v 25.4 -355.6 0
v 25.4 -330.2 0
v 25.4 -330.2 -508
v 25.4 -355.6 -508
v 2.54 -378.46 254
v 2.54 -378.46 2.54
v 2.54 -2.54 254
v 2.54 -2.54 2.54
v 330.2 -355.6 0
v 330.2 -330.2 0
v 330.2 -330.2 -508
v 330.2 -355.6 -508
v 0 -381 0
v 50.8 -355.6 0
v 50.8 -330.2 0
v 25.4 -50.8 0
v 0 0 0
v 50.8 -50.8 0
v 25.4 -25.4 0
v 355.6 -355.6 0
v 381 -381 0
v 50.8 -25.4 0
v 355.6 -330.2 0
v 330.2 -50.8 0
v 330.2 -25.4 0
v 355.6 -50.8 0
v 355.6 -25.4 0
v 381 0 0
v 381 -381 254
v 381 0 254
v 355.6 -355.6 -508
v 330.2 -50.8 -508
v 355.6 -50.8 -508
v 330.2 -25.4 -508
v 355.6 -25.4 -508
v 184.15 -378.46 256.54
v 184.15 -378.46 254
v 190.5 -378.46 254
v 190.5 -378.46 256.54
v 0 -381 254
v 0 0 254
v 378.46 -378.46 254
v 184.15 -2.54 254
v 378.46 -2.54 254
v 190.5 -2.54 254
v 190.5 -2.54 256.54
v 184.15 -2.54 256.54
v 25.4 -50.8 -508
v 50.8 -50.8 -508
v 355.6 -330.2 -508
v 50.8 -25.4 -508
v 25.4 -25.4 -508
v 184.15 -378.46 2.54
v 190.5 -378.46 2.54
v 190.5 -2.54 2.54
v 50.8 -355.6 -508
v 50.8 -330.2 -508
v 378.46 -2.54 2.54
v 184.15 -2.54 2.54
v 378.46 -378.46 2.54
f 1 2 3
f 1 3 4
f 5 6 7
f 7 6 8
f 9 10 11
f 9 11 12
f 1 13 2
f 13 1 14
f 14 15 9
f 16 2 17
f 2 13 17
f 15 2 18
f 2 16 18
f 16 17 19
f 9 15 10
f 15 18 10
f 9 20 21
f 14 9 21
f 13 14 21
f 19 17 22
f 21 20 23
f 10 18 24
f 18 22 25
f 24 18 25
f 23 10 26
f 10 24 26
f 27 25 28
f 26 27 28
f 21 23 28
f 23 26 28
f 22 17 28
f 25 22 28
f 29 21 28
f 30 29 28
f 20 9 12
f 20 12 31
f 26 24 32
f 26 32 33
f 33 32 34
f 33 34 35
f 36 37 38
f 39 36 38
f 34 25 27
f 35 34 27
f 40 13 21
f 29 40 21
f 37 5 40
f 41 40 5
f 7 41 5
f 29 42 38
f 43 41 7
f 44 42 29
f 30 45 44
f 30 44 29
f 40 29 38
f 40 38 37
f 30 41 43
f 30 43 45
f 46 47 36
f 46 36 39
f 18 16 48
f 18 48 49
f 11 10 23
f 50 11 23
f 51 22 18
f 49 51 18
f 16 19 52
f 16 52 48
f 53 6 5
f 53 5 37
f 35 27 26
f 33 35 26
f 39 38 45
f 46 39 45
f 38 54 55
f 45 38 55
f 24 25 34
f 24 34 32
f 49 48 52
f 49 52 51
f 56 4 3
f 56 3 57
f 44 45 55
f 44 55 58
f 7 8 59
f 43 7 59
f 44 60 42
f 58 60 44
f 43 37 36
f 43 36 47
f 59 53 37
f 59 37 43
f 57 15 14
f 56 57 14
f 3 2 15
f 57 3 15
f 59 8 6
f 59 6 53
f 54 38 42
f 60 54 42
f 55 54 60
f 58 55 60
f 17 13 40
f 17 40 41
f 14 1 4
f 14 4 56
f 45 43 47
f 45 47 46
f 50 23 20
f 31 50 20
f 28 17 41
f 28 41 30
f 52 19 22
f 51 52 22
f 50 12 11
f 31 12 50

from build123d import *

# Parameters (mm, degrees)
F0_W     = 381
F0_H     = 381
F1_DEPTH = 254
F2_T     = -2.54
F3_W     = 25.4
F3_H     = 25.4
F4_DEPTH = 508
F5_W     = 6.35
F5_H     = 375.92
F6_DEPTH = 254


with BuildPart() as f1:
    # F0 (on Top) → F1 (new body)
    with BuildSketch(Plane.XY):
        with Locations((190.5, -190.5)):
            Rectangle(F0_W, F0_H)
    extrude(amount=F1_DEPTH)

    # F2
    f2_openings = [f1.faces().sort_by_distance(p)[0] for p in [
        (190.5, -190.5, 254),
    ]]
    offset(amount=F2_T, openings=f2_openings)

    # F3 (on face) → F4 (join)
    with BuildSketch(Plane(origin=(0, 0, 0), x_dir=(1, 0, 0), z_dir=(0, 0, -1))):
        with Locations((38.1, 342.9)):
            Rectangle(F3_W, F3_H)
        with Locations((342.9, 342.9)):
            Rectangle(F3_W, F3_H)
        with Locations((38.1, 38.1)):
            Rectangle(F3_W, F3_H)
        with Locations((342.9, 38.1)):
            Rectangle(F3_W, F3_H)
    extrude(amount=F4_DEPTH)

    # F5 (on face) → F6 (join)
    with BuildSketch(Plane.XY.offset(2.54)):
        with Locations((187.325, -190.5)):
            Rectangle(F5_W, F5_H)
    extrude(amount=F6_DEPTH)


solid = f1.part
